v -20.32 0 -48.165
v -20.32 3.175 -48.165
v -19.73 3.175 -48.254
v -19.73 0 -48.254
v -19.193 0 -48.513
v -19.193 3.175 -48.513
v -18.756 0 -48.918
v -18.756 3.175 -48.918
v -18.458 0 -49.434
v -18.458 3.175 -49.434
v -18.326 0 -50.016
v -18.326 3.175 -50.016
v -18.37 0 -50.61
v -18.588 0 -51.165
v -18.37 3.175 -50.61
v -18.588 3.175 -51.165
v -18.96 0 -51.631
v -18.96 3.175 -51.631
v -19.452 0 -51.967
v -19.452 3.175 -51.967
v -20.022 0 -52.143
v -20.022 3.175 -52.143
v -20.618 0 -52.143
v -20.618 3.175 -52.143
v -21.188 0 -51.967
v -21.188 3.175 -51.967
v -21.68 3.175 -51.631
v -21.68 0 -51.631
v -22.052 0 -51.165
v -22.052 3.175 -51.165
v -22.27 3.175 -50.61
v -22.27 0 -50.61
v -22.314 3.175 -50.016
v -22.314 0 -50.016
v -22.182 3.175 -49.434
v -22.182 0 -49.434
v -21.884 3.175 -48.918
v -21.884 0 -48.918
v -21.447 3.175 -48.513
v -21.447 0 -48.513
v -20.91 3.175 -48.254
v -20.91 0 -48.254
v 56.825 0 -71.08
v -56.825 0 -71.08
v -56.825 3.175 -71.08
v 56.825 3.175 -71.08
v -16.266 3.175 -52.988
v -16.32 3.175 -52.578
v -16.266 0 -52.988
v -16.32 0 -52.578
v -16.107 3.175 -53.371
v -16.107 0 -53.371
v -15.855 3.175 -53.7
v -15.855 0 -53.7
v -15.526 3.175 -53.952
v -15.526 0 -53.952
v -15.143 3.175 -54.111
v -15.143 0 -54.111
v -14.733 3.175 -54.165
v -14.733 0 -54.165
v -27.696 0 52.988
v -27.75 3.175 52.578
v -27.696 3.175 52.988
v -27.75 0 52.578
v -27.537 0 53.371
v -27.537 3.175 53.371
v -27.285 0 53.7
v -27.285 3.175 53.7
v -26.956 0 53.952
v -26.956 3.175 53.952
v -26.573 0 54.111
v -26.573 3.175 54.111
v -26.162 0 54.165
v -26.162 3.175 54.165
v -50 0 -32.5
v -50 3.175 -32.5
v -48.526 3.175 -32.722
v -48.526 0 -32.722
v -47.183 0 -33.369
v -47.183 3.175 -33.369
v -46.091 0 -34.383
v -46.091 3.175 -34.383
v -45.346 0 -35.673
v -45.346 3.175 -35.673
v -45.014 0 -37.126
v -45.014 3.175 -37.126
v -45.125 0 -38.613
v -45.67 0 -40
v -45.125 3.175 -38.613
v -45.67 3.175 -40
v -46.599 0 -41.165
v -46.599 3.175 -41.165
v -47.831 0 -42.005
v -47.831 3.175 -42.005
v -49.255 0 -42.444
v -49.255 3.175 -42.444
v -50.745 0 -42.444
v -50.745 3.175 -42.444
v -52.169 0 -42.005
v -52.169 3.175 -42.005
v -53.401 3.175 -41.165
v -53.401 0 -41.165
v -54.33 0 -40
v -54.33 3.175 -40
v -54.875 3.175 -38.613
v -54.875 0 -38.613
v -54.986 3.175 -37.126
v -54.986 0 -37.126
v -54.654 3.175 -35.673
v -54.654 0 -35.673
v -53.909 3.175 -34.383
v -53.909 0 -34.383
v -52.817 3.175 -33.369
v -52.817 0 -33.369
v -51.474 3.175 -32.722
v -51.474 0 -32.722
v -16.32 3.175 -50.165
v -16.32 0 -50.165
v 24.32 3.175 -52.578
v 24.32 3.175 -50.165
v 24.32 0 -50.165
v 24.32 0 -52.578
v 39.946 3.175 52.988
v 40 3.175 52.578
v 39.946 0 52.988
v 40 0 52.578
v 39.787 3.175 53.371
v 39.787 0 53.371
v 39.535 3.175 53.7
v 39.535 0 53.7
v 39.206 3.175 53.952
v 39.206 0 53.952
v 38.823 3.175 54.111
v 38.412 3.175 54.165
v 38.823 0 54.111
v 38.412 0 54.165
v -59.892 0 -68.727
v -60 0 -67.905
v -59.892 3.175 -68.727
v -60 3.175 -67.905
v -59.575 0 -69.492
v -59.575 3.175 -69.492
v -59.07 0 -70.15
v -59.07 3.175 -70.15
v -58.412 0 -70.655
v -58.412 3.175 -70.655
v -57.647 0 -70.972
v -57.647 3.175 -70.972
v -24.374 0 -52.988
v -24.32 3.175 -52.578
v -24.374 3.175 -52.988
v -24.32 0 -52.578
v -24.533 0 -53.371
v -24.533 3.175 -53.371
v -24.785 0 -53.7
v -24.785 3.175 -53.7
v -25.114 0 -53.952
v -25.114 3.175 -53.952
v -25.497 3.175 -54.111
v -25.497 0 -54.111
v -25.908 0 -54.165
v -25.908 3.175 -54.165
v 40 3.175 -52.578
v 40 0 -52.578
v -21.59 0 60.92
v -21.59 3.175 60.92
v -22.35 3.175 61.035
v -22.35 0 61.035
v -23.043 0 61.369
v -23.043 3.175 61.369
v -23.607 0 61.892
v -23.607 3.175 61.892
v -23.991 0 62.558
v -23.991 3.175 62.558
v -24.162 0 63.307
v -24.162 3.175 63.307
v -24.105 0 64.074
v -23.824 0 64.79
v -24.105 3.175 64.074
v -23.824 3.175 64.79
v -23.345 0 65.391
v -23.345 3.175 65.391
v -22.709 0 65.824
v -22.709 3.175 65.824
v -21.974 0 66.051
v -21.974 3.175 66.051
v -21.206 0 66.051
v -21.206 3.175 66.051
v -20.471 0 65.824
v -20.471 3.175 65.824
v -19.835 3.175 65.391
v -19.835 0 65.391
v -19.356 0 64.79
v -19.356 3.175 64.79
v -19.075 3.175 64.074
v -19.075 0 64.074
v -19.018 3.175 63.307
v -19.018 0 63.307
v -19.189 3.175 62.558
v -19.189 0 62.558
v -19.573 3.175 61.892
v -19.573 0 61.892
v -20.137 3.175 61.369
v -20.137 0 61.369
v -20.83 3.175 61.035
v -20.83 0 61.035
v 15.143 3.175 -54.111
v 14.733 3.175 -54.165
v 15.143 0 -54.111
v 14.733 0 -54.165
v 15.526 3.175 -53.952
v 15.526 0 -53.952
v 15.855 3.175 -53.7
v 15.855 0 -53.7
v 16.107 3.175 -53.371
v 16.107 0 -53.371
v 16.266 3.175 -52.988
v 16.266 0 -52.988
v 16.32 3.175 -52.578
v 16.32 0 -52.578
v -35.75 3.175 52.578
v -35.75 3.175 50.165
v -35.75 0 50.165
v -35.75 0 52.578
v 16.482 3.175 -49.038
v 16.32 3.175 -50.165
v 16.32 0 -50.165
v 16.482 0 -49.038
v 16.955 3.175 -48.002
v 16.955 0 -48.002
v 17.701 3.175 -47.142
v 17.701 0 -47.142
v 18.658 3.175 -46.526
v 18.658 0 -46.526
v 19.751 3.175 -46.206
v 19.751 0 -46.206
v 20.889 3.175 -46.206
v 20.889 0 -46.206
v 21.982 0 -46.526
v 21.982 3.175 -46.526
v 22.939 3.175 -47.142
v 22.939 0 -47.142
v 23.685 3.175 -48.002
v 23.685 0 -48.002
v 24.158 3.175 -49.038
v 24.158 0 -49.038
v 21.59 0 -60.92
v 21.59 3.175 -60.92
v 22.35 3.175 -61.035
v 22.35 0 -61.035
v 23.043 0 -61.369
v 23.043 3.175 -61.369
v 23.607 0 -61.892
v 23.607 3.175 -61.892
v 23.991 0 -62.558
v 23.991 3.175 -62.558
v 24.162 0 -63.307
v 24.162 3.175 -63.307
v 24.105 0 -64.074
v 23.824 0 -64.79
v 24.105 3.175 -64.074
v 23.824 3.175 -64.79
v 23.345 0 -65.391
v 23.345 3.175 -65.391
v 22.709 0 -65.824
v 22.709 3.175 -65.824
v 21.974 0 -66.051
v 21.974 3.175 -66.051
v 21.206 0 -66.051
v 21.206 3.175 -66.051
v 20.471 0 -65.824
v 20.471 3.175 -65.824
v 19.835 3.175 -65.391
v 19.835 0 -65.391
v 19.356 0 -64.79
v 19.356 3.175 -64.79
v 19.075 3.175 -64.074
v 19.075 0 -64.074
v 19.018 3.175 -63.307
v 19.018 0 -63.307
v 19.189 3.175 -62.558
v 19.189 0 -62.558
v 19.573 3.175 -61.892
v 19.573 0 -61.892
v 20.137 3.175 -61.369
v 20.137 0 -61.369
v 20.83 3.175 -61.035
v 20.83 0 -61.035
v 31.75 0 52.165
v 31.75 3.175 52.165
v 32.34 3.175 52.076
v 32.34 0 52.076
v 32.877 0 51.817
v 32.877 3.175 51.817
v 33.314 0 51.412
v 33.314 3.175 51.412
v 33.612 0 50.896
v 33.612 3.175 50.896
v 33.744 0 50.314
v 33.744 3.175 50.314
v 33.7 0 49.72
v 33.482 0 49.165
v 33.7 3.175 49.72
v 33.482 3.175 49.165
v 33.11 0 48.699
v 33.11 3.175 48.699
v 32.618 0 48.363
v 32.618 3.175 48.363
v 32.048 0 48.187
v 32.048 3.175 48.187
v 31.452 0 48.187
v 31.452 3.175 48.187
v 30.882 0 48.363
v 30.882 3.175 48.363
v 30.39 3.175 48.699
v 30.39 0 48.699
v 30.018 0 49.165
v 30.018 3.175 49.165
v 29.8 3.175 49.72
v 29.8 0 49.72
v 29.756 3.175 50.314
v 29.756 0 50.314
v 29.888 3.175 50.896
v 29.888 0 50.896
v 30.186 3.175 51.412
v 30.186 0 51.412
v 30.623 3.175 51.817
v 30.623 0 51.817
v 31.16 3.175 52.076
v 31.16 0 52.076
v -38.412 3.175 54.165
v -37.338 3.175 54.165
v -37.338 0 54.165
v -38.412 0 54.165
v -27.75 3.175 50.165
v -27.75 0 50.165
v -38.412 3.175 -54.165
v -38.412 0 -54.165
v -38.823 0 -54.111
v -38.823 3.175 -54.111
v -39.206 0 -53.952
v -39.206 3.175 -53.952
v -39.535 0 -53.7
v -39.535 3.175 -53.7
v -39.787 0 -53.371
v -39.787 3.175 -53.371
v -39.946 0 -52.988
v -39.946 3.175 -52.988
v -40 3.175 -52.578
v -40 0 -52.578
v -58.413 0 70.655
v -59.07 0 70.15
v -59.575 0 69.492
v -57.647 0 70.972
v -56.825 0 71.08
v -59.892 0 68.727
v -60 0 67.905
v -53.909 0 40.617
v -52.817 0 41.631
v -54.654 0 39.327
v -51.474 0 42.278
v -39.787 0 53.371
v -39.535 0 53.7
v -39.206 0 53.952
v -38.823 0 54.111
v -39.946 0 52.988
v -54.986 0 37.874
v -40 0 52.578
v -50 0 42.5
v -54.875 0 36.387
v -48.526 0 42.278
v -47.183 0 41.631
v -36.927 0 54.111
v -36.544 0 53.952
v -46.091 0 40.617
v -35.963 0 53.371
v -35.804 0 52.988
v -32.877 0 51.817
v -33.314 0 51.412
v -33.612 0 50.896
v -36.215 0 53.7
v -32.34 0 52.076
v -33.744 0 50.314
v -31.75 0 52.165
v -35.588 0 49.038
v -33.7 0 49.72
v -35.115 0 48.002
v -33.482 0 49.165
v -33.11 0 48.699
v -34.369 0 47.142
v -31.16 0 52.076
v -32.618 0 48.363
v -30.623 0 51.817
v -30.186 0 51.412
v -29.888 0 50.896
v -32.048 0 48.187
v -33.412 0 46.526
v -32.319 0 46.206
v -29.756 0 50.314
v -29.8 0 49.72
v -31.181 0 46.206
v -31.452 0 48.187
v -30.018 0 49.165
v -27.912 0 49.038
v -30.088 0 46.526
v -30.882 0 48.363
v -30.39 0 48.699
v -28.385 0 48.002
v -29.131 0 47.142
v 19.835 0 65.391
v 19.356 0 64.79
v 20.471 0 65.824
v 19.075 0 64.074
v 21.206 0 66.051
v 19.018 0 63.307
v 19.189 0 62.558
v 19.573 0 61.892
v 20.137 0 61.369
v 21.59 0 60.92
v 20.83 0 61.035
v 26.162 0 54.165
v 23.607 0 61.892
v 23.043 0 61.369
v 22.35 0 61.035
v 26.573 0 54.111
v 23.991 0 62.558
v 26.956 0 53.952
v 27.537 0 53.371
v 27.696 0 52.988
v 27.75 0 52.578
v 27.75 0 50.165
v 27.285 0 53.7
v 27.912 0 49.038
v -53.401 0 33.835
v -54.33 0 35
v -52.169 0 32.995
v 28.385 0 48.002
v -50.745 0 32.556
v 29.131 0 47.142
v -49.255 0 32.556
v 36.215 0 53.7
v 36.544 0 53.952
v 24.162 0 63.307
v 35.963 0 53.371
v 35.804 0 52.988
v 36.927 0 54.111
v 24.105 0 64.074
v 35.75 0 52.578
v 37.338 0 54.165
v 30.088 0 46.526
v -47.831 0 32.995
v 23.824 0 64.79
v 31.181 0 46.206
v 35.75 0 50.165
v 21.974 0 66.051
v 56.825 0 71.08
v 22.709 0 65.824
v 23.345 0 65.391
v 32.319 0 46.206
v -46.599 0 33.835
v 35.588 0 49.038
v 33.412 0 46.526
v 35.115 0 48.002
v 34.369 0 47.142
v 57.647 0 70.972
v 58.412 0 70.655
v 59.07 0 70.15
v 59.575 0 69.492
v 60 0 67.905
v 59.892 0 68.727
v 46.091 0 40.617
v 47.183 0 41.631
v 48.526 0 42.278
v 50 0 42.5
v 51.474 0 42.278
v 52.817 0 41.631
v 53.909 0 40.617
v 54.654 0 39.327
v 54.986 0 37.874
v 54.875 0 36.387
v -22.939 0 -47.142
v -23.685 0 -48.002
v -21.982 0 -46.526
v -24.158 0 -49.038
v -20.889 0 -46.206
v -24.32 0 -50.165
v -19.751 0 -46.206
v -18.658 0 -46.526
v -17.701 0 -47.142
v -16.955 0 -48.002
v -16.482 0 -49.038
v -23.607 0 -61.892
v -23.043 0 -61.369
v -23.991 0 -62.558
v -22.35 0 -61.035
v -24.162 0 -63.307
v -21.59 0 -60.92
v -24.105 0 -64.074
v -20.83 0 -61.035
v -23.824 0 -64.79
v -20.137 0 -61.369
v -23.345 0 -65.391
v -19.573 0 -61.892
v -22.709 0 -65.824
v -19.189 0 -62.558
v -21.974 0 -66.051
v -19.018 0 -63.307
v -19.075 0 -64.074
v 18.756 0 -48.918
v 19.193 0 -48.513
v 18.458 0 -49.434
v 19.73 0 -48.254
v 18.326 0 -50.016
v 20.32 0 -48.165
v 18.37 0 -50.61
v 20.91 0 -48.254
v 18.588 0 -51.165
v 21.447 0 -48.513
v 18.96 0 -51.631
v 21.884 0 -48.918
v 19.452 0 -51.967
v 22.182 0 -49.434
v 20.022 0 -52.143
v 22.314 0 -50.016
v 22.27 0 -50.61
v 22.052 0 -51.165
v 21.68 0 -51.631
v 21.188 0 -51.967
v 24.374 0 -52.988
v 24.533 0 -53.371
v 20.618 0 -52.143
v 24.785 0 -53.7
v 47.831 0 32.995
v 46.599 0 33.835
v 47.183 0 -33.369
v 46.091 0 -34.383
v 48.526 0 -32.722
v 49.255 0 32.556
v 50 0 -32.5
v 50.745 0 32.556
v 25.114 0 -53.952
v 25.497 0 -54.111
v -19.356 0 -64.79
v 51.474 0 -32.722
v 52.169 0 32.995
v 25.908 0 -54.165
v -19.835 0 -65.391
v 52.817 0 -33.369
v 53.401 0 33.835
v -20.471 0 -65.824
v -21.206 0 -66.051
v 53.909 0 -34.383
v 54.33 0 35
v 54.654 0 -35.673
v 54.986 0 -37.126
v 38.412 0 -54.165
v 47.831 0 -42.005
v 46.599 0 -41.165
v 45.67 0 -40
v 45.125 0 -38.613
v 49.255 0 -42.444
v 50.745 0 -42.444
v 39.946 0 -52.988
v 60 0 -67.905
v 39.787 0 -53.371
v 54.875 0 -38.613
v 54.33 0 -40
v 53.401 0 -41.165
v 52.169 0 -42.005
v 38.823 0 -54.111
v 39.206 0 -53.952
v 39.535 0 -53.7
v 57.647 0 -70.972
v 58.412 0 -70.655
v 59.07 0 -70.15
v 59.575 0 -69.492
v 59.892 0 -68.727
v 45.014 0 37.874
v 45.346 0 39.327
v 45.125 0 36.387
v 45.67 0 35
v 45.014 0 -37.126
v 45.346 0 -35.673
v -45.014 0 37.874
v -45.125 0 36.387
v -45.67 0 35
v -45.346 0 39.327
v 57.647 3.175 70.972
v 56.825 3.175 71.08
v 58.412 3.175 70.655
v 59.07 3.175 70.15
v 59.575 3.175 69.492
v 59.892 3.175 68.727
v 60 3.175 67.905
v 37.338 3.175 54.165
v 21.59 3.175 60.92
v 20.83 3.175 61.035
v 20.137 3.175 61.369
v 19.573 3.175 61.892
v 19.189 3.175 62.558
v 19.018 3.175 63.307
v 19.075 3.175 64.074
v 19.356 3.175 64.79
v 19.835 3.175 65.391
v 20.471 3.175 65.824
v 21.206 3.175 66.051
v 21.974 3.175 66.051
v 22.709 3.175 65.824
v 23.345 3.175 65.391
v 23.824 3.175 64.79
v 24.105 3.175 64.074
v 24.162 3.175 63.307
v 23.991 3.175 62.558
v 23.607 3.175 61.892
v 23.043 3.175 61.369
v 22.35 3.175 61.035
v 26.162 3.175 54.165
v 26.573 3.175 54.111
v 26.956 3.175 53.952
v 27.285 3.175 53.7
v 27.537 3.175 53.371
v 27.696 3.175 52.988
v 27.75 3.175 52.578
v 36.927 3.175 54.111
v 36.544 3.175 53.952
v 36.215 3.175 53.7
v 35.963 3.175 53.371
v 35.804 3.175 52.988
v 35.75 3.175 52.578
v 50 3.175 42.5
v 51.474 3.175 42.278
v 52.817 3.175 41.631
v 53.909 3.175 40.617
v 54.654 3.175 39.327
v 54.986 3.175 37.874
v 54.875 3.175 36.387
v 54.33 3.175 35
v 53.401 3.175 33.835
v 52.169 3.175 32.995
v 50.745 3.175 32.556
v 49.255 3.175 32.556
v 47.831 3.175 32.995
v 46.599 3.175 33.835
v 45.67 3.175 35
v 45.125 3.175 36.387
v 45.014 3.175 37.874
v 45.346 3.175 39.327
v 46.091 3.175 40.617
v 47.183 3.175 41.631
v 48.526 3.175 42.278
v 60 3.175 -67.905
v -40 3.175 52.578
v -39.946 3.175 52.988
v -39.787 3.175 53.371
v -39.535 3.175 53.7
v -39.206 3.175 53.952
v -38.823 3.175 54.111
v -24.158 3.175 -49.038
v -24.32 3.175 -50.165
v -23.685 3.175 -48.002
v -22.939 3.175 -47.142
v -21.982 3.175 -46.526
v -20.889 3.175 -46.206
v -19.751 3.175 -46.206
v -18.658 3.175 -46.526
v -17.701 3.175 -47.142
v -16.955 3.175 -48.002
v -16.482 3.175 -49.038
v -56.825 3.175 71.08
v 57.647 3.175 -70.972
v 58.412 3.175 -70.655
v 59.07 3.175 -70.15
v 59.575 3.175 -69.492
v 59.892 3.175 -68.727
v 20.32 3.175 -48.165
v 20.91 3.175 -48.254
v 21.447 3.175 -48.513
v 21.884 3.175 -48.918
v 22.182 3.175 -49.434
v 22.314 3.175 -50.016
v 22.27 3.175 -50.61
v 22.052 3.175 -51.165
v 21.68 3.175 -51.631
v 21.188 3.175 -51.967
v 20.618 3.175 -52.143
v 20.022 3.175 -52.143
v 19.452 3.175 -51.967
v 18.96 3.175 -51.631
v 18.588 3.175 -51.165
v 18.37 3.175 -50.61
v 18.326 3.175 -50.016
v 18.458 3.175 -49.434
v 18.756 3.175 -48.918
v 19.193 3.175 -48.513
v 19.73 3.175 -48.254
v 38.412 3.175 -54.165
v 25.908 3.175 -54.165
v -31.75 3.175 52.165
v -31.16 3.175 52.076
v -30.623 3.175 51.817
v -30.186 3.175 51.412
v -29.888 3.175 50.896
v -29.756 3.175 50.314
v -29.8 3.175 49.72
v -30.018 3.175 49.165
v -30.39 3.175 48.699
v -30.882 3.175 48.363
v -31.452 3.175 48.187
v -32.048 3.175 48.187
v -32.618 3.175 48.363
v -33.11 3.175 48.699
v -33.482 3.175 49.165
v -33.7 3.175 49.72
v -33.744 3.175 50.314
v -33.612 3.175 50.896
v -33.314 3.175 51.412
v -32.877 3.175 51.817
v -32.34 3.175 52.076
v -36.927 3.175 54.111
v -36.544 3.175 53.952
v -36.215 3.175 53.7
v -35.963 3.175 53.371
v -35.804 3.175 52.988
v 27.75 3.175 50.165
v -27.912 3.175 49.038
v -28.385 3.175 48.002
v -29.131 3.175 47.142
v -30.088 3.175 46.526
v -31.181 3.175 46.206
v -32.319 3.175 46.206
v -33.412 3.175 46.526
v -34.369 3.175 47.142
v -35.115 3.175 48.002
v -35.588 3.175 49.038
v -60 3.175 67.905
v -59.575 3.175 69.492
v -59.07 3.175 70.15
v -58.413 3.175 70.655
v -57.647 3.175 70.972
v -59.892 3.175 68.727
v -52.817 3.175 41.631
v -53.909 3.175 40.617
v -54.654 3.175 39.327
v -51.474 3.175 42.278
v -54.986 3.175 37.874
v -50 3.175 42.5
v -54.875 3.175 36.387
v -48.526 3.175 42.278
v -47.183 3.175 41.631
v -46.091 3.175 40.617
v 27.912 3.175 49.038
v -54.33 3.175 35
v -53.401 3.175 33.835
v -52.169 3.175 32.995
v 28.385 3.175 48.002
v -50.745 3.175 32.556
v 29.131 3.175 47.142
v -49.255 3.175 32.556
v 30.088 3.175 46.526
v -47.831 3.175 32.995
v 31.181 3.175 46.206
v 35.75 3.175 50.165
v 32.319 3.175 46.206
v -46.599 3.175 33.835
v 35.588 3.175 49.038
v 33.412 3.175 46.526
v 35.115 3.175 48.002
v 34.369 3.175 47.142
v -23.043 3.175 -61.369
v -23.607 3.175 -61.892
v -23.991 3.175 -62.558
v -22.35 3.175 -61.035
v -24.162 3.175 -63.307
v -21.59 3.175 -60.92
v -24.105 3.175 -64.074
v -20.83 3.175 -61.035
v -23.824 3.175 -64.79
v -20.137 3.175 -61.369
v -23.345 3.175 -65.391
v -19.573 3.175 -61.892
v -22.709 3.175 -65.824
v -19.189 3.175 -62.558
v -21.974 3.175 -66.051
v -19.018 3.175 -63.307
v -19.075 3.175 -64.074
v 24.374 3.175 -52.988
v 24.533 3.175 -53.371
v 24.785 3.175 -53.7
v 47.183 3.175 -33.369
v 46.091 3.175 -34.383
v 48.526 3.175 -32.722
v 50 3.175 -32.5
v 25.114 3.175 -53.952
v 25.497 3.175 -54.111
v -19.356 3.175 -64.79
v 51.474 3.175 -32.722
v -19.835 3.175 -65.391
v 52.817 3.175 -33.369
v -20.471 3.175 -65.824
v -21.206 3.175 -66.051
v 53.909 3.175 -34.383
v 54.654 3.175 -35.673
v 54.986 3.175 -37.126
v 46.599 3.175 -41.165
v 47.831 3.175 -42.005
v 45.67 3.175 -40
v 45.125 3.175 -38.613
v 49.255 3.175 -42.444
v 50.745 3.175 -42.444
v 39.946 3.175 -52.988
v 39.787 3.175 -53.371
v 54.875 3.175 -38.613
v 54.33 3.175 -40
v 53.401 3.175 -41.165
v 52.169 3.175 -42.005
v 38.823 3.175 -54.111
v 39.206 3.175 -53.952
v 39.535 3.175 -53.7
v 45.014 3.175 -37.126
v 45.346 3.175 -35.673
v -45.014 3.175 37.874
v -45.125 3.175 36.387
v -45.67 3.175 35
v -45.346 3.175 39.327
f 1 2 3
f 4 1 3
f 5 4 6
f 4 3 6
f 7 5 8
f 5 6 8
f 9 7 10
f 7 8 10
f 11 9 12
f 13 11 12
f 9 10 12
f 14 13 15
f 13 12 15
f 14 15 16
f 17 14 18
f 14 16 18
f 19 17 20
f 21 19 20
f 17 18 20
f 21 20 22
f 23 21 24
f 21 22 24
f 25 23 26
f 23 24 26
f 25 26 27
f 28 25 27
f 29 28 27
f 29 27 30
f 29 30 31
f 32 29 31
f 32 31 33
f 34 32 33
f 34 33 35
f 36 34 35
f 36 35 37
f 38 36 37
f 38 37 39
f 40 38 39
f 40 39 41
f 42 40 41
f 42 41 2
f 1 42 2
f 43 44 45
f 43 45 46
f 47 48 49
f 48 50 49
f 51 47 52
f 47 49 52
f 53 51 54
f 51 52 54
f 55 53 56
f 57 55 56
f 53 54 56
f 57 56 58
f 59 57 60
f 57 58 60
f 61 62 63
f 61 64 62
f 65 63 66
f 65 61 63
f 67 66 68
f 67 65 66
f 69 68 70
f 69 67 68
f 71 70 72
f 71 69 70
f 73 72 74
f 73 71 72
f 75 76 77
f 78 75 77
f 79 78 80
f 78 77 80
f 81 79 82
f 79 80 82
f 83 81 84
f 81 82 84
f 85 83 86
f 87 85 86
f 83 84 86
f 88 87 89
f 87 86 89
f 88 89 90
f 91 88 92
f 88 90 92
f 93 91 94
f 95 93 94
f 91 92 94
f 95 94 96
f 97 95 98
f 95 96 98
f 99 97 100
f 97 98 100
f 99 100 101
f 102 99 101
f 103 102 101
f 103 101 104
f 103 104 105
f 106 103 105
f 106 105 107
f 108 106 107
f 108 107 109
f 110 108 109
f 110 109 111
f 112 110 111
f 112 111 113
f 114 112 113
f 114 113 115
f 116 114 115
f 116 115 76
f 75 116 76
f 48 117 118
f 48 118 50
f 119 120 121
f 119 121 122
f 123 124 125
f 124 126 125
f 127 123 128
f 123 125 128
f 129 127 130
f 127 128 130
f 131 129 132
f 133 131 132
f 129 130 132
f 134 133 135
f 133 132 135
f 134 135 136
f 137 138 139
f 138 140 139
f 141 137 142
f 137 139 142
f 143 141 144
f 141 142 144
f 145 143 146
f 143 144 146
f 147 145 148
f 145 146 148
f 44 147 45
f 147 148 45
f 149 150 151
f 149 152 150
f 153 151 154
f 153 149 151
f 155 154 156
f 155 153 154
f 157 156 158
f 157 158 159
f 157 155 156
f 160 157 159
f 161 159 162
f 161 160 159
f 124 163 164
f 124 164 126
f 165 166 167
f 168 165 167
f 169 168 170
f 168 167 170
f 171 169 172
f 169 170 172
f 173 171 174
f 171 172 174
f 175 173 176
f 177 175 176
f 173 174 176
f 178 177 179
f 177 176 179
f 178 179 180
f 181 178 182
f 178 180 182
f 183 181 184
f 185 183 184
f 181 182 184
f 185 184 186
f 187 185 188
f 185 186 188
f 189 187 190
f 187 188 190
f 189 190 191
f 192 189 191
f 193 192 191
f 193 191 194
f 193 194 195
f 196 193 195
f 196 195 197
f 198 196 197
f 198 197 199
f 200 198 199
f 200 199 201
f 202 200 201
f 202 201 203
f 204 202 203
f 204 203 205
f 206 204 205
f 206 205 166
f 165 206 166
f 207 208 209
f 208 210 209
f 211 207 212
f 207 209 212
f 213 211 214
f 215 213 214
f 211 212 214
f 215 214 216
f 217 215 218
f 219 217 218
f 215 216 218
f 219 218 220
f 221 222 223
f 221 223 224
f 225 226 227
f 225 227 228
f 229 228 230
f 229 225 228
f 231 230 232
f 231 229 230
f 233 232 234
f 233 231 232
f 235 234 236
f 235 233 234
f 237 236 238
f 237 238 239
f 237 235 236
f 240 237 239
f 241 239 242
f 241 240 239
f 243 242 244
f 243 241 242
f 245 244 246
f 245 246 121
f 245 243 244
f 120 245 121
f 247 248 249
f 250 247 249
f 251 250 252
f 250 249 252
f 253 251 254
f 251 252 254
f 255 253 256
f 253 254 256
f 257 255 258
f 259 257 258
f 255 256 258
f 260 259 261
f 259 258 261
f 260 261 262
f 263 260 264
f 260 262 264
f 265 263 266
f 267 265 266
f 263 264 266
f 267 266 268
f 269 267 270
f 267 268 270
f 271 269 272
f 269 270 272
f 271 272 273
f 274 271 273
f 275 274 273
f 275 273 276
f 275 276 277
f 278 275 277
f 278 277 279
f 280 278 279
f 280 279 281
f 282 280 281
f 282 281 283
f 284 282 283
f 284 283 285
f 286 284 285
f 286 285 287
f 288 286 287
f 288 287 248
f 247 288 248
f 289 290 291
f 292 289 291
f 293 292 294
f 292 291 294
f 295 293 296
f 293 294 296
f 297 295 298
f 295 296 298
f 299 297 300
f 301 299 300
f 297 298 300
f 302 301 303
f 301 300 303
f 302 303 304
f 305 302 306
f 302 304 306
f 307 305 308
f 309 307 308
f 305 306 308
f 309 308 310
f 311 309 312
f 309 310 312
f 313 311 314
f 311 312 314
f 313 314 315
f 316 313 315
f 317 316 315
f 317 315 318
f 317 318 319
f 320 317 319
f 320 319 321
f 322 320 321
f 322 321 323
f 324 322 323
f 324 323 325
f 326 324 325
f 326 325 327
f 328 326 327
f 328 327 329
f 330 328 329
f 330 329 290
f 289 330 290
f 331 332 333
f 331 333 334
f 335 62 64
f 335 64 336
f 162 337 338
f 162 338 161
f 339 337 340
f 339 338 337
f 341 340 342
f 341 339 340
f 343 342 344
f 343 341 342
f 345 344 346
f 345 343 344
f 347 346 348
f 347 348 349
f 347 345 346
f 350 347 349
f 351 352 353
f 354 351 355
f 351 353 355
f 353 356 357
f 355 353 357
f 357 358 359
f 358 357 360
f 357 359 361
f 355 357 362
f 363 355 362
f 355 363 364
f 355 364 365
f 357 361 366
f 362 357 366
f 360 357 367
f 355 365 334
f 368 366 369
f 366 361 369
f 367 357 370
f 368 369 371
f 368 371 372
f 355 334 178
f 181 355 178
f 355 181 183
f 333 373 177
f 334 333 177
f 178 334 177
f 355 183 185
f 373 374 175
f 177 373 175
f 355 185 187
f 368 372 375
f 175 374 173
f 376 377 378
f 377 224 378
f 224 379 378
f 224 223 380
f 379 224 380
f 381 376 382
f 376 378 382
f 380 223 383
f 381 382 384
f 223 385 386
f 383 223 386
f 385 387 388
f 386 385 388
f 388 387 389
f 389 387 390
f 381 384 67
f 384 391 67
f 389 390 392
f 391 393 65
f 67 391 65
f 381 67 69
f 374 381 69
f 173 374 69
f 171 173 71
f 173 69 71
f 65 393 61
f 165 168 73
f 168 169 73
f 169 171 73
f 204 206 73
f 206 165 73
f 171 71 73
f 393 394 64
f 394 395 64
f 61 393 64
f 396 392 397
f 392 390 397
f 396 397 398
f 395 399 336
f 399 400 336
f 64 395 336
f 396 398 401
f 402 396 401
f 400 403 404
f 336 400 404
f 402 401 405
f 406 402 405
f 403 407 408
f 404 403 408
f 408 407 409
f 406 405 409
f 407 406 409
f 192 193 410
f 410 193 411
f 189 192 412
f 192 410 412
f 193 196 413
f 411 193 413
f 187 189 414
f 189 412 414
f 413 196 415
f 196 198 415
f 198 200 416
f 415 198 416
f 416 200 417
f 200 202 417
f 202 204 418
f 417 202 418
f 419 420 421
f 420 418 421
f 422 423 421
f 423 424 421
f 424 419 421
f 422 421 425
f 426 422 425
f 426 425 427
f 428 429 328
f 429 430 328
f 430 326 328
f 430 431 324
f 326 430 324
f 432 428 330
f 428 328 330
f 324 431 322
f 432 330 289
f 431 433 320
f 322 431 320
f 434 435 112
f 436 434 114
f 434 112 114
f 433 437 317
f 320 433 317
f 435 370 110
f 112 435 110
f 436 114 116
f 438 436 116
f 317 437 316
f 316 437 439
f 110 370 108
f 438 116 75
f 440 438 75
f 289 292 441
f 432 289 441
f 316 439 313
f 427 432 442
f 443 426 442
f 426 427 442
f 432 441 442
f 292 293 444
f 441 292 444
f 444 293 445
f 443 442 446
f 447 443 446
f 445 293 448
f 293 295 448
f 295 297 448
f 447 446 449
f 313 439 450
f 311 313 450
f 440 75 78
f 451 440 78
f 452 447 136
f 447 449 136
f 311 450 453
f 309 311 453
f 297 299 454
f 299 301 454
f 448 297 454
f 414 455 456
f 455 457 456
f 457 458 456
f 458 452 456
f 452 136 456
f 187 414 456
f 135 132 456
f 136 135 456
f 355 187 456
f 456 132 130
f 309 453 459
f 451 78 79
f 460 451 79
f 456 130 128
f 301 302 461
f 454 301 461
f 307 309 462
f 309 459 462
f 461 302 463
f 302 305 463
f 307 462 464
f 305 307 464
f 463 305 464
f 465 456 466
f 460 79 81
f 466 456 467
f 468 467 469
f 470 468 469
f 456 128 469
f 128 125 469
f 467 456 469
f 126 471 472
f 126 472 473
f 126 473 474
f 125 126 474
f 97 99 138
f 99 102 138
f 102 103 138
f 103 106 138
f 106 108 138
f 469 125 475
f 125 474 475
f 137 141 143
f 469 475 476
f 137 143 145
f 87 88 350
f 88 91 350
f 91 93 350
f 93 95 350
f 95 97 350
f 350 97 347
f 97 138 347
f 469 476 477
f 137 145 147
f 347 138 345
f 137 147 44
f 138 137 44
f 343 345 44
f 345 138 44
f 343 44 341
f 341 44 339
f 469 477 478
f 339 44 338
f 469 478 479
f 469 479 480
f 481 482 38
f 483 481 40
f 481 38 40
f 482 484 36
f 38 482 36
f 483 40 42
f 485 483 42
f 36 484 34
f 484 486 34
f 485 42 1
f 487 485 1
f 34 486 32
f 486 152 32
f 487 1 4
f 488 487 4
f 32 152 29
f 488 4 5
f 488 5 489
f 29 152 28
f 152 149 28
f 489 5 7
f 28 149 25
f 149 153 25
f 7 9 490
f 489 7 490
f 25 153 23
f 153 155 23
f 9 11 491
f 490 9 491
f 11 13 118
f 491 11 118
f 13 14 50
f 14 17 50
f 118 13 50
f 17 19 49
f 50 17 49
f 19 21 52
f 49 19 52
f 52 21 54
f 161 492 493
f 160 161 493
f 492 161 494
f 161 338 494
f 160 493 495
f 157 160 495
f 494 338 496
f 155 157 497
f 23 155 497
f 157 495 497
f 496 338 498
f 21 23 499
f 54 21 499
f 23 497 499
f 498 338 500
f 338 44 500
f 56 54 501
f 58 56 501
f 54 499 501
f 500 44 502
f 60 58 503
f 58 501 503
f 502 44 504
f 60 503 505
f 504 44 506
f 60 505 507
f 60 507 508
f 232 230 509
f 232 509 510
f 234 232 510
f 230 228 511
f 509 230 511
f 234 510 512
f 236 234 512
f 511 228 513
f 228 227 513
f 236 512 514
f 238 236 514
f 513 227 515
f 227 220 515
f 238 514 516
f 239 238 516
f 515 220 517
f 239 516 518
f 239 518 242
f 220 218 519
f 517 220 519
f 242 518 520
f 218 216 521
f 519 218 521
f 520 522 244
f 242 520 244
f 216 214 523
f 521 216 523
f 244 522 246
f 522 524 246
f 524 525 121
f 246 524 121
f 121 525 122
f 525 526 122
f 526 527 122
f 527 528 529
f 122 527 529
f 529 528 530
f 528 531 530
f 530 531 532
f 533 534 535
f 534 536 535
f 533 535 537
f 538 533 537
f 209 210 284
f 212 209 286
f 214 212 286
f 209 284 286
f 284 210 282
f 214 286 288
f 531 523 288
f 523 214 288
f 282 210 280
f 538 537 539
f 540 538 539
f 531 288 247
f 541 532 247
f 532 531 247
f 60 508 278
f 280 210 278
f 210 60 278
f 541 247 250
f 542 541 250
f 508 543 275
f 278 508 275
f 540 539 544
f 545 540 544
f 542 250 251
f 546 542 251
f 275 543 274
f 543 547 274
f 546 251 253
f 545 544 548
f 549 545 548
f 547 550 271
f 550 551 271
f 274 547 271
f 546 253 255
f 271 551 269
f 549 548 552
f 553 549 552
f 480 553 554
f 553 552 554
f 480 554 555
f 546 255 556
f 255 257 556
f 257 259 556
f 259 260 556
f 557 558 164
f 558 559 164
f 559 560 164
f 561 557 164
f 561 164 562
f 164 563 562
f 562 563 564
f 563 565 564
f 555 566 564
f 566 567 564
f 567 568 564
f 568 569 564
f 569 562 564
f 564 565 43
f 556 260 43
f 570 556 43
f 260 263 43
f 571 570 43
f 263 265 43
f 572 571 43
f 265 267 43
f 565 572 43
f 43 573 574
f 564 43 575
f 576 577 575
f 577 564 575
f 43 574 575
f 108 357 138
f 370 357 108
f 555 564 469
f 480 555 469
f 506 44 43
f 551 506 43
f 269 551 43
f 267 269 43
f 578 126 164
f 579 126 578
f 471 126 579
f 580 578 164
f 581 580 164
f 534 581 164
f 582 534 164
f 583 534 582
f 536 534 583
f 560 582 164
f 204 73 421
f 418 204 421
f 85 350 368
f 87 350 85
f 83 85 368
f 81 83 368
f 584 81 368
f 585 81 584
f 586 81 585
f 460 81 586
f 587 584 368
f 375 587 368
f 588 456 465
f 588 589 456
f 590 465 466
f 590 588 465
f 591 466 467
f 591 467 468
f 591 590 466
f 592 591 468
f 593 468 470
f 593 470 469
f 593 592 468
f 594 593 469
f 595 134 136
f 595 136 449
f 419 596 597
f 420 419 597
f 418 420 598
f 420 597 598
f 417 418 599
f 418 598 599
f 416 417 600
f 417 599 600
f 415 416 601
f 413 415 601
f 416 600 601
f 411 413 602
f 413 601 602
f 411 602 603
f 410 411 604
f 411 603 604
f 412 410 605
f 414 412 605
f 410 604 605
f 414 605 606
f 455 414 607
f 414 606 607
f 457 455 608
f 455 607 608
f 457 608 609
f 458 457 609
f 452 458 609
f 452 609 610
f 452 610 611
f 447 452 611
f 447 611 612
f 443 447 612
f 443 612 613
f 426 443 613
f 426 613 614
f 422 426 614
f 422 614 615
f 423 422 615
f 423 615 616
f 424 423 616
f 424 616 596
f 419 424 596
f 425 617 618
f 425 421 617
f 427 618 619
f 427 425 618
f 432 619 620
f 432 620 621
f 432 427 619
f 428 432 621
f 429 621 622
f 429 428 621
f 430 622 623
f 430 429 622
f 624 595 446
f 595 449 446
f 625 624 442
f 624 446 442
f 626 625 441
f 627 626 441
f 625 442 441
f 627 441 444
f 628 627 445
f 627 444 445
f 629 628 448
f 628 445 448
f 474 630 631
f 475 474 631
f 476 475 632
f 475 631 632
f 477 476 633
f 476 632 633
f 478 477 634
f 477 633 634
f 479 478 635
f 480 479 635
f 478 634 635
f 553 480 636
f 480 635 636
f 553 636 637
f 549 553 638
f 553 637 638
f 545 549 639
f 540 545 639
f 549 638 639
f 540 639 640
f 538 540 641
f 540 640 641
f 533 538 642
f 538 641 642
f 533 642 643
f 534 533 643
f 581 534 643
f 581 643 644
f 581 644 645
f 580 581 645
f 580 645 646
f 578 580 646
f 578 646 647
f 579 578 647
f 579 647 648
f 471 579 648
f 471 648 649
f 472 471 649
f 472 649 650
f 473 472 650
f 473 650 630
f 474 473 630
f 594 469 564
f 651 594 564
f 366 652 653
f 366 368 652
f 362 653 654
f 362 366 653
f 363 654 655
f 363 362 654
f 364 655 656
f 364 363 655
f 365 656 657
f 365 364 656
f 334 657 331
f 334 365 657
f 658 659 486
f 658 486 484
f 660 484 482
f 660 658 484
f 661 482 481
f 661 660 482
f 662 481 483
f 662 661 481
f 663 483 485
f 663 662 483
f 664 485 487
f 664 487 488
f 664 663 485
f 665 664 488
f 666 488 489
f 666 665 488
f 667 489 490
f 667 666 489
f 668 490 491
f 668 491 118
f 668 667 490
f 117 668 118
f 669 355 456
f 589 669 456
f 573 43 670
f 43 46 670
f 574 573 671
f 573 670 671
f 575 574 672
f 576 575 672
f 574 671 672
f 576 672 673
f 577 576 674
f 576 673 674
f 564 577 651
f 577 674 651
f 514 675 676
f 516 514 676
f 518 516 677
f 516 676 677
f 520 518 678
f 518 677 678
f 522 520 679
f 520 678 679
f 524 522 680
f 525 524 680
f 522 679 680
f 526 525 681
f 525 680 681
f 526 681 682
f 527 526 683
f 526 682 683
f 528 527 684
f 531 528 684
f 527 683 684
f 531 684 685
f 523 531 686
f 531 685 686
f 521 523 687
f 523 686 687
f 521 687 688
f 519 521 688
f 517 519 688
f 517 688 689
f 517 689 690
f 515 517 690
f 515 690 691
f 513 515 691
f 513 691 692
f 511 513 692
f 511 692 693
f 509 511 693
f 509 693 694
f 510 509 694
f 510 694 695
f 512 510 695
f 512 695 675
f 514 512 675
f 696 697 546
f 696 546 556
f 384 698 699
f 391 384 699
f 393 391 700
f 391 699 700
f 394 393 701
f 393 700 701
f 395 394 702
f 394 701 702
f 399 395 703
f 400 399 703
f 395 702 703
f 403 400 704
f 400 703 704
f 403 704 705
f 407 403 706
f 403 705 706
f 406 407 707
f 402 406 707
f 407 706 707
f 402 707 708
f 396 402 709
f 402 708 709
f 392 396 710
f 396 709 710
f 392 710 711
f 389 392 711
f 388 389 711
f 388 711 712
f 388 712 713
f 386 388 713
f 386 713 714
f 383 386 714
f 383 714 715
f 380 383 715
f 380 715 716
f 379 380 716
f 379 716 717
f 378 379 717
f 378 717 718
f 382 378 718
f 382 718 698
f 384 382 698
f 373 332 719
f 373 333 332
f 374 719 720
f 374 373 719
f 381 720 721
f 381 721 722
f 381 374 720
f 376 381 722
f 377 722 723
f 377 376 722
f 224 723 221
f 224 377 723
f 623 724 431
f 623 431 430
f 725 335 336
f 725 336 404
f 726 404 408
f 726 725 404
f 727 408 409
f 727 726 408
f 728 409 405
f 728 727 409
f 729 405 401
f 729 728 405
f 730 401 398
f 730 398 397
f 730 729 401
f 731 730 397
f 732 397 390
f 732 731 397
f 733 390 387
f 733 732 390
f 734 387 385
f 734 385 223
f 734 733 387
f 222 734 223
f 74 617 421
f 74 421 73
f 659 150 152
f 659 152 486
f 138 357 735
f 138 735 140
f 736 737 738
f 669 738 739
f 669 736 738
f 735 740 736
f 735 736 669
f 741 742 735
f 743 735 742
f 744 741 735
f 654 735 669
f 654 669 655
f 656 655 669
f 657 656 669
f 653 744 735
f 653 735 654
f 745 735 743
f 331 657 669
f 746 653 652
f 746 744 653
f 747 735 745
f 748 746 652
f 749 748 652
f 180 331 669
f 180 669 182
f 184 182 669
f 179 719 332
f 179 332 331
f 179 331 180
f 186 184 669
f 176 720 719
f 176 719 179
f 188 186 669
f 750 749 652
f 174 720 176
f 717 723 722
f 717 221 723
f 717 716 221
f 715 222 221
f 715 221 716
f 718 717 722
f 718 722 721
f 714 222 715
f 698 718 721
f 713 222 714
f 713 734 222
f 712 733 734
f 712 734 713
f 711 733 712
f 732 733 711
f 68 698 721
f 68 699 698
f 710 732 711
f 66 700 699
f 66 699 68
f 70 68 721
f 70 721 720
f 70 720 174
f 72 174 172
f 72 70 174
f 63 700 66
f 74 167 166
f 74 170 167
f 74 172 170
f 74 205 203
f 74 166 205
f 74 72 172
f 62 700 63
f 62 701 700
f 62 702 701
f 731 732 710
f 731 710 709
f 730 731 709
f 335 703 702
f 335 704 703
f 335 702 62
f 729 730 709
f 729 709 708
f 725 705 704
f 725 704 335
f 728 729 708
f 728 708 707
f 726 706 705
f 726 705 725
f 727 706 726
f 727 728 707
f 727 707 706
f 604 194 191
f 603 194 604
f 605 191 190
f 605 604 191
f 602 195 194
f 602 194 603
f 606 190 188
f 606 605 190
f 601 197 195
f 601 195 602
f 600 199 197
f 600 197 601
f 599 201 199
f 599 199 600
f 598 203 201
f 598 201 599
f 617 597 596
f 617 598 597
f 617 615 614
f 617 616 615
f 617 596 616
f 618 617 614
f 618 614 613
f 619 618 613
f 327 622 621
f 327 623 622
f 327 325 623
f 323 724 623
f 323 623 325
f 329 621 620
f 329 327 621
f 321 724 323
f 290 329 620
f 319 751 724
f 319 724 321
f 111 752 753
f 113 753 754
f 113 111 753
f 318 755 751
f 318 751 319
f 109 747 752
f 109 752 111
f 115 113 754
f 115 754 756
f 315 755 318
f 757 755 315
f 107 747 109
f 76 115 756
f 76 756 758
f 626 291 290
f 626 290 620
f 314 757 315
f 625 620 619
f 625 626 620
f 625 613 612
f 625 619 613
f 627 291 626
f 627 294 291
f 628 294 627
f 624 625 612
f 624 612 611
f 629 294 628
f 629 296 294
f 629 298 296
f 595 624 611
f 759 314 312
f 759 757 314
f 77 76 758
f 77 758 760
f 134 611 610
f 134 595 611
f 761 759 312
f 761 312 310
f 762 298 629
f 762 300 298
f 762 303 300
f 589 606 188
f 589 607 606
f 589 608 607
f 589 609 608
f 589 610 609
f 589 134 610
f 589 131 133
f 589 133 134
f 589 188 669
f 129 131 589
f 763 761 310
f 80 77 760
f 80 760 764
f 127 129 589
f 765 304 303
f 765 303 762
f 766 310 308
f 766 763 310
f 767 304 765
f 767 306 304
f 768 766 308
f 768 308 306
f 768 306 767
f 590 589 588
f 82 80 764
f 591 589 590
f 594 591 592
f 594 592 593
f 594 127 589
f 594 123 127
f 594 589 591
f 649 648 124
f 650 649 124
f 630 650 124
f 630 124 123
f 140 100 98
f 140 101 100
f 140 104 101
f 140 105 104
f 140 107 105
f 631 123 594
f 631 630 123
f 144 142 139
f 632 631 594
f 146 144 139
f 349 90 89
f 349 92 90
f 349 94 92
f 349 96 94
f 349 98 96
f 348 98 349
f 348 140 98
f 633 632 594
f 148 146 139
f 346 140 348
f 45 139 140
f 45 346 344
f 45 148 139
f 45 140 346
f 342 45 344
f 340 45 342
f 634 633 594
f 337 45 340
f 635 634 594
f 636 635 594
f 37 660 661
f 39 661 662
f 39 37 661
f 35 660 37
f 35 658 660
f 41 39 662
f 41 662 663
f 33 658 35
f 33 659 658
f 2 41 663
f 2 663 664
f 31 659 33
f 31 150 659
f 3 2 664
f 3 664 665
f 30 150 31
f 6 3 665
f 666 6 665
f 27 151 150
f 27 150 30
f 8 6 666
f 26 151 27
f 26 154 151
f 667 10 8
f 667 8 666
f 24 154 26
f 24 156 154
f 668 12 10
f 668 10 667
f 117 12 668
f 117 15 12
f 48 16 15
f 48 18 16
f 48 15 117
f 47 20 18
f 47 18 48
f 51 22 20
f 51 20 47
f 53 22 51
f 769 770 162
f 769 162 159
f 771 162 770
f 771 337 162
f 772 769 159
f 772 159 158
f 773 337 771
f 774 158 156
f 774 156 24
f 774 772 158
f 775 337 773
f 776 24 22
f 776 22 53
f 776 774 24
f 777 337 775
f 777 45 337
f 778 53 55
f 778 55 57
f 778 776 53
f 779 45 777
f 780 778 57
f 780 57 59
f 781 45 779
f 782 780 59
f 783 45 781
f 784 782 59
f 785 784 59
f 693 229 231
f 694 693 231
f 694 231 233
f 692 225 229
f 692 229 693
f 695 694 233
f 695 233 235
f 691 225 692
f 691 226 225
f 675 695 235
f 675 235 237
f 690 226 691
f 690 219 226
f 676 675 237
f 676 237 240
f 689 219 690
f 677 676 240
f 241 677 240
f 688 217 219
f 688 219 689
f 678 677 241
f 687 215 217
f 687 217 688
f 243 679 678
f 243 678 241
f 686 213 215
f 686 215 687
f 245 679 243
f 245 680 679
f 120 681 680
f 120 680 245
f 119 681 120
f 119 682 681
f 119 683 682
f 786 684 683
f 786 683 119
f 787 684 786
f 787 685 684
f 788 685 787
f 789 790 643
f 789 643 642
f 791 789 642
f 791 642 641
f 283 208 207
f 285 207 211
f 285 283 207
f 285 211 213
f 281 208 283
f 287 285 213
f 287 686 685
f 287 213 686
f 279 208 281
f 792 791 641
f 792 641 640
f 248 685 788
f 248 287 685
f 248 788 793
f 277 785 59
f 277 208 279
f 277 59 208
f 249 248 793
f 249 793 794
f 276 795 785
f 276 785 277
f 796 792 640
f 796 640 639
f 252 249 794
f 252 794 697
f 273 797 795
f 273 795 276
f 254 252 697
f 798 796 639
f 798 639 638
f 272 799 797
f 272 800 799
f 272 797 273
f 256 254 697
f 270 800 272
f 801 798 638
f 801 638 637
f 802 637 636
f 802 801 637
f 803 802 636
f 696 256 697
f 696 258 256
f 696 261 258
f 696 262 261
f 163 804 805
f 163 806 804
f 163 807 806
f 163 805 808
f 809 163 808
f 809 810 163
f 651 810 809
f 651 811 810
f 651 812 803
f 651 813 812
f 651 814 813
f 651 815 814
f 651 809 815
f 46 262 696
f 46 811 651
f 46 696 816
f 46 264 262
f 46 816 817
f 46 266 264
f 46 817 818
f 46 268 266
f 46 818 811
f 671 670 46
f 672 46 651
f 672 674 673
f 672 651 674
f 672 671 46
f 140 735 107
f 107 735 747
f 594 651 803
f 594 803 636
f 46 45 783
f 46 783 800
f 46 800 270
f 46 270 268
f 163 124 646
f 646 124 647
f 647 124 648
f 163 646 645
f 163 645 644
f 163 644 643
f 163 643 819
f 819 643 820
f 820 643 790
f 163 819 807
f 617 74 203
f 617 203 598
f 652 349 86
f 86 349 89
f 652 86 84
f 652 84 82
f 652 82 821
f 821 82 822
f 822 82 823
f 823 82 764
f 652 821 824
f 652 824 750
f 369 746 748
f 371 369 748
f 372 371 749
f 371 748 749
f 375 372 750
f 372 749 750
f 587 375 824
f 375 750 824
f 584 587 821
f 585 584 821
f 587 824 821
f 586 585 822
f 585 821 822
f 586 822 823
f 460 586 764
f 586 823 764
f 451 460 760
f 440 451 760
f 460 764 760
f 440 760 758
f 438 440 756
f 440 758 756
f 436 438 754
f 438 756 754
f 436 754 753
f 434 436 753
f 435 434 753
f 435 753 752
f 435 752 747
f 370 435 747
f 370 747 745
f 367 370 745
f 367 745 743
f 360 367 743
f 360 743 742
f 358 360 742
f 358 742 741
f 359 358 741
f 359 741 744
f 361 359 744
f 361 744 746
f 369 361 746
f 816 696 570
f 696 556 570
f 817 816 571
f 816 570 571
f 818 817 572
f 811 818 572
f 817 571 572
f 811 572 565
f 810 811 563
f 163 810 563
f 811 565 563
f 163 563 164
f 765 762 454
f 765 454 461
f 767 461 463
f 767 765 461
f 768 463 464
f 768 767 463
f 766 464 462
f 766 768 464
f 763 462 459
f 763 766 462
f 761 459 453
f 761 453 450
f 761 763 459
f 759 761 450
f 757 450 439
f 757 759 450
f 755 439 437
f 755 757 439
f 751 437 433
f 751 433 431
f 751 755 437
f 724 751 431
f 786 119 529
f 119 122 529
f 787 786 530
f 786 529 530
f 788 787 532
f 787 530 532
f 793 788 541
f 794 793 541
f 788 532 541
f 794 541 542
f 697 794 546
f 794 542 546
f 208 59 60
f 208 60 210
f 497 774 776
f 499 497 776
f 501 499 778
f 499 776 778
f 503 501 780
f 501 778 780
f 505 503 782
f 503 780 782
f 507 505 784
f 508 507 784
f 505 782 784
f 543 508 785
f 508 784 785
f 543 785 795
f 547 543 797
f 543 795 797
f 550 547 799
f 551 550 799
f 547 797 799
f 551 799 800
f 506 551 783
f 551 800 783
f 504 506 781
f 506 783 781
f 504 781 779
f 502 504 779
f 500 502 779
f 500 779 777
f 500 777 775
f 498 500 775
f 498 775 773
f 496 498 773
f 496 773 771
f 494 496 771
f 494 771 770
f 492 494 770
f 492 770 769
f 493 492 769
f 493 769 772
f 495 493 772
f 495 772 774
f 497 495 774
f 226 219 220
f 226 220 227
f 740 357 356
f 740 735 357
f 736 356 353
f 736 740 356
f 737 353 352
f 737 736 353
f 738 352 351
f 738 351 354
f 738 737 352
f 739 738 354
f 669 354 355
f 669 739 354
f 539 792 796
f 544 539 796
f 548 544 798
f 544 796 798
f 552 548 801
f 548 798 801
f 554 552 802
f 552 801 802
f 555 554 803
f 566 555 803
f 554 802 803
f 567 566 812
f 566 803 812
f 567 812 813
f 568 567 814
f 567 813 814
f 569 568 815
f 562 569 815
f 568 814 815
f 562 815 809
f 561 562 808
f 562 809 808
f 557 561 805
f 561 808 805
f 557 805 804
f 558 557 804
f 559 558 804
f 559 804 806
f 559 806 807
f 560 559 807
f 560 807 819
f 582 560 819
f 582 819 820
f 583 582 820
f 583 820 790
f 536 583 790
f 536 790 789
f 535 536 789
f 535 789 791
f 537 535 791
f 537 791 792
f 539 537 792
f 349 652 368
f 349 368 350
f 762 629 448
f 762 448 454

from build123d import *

# Parameters (mm, degrees)
SKETCH1_W           = 120
SKETCH1_H           = 142.16
BOSS_EXTRUDE1_DEPTH = 3.175
SKETCH2_R           = 5
CUT_EXTRUDE1_DEPTH  = 94.072267755
SKETCH3_R           = 2
CUT_EXTRUDE2_DEPTH  = 94.072267755
SKETCH4_R           = 2.5796875
CUT_EXTRUDE3_DEPTH  = 94.072267755
FILLET1_R           = 1.5875
FILLET2_R           = 3.175


with BuildPart() as part:
    # Sketch1 → Boss-Extrude1 (new body)
    with BuildSketch(Plane(origin=(0, 0, 0), x_dir=(1, 0, 0), z_dir=(0, 1, 0))):
        Rectangle(SKETCH1_W, SKETCH1_H)
    extrude(amount=BOSS_EXTRUDE1_DEPTH)

    # Sketch2 → Cut-Extrude1 (cut, through all)
    with BuildSketch(Plane(origin=(0, 3.175, 0), x_dir=(1, 0, 0), z_dir=(0, 1, 0))):
        with Locations(Location((-50, -37.5, 0), (0, 0, 270))):
            Circle(SKETCH2_R)
        with Locations(Location((50, -37.5, 0), (0, 0, 270))):
            Circle(SKETCH2_R)
        with Locations(Location((50, 37.5, 0), (0, 0, 270))):
            Circle(SKETCH2_R)
        with Locations(Location((-50, 37.5, 0), (0, 0, 270))):
            Circle(SKETCH2_R)
    extrude(amount=-CUT_EXTRUDE1_DEPTH, mode=Mode.SUBTRACT)

    # Sketch3 → Cut-Extrude2 (cut, through all)
    with BuildSketch(Plane(origin=(0, 3.175, 0), x_dir=(1, 0, 0), z_dir=(0, 1, 0))):
        with Locations(Location((31.75, -50.165011564, 0), (0, 0, 270))):
            Circle(SKETCH3_R)
        with Locations(Location((-31.75, -50.165011564, 0), (0, 0, 270))):
            Circle(SKETCH3_R)
        with Locations(Location((20.32, 50.165011564, 0), (0, 0, 270))):
            Circle(SKETCH3_R)
        with Locations(Location((-20.32, 50.165011564, 0), (0, 0, 270))):
            Circle(SKETCH3_R)
        with BuildLine():
            Line((-16.32, 50.165011564), (-16.32, 54.165011564))
            Line((-16.32, 54.165011564), (16.32, 54.165011564))
            Line((16.32, 54.165011564), (16.32, 50.165011564))
            ThreePointArc((16.32, 50.165011564), (20.32, 46.165011564), (24.32, 50.165011564))
            Line((24.32, 50.165011564), (24.32, 54.165011564))
            Line((24.32, 54.165011564), (40, 54.165011564))
            Line((40, 54.165011564), (40, -54.165011564))
            Line((40, -54.165011564), (35.75, -54.165011564))
            Line((35.75, -54.165011564), (35.75, -50.165011564))
            ThreePointArc((35.75, -50.165011564), (31.75, -46.165011564), (27.75, -50.165011564))
            Line((27.75, -50.165011564), (27.75, -54.165011564))
            Line((27.75, -54.165011564), (-27.75, -54.165011564))
            Line((-27.75, -54.165011564), (-27.75, -50.165011564))
            ThreePointArc((-27.75, -50.165011564), (-31.75, -46.165011564), (-35.75, -50.165011564))
            Line((-35.75, -50.165011564), (-35.75, -54.165011564))
            Line((-35.75, -54.165011564), (-40, -54.165011564))
            Line((-40, -54.165011564), (-40, 54.165011564))
            Line((-40, 54.165011564), (-24.32, 54.165011564))
            Line((-24.32, 54.165011564), (-24.32, 50.165011564))
            ThreePointArc((-24.32, 50.165011564), (-20.32, 46.165011564), (-16.32, 50.165011564))
        make_face()
    extrude(amount=-CUT_EXTRUDE2_DEPTH, mode=Mode.SUBTRACT)

    # Sketch4 → Cut-Extrude3 (cut, through all)
    with BuildSketch(Plane(origin=(0, 3.175, 0), x_dir=(1, 0, 0), z_dir=(0, 1, 0))):
        with Locations(Location((-21.59, 63.5, 0), (0, 0, 270))):
            Circle(SKETCH4_R)
        with Locations(Location((21.59, 63.5, 0), (0, 0, 270))):
            Circle(SKETCH4_R)
        with Locations(Location((-21.59, -63.5, 0), (0, 0, 90))):
            Circle(SKETCH4_R)
        with Locations(Location((21.59, -63.5, 0), (0, 0, 90))):
            Circle(SKETCH4_R)
    extrude(amount=-CUT_EXTRUDE3_DEPTH, mode=Mode.SUBTRACT)

    # Fillet1
    fillet1_edges = [part.edges().sort_by_distance(p)[0] for p in [
        (-16.32, 1.5875, -54.165011564),
        (16.32, 1.5875, -54.165011564),
        (24.32, 1.5875, -54.165011564),
        (40, 1.5875, -54.165011564),
        (40, 1.5875, 54.165011564),
        (35.75, 1.5875, 54.165011564),
        (27.75, 1.5875, 54.165011564),
        (-27.75, 1.5875, 54.165011564),
        (-35.75, 1.5875, 54.165011564),
        (-40, 1.5875, 54.165011564),
        (-40, 1.5875, -54.165011564),
        (-24.32, 1.5875, -54.165011564),
    ]]
    fillet(fillet1_edges, radius=FILLET1_R)

    # Fillet2
    fillet2_edges = [part.edges().sort_by_distance(p)[0] for p in [
        (60, 1.5875, 71.08),
        (-60, 1.5875, 71.08),
        (-60, 1.5875, -71.08),
        (60, 1.5875, -71.08),
    ]]
    fillet(fillet2_edges, radius=FILLET2_R)


solid = part.part
